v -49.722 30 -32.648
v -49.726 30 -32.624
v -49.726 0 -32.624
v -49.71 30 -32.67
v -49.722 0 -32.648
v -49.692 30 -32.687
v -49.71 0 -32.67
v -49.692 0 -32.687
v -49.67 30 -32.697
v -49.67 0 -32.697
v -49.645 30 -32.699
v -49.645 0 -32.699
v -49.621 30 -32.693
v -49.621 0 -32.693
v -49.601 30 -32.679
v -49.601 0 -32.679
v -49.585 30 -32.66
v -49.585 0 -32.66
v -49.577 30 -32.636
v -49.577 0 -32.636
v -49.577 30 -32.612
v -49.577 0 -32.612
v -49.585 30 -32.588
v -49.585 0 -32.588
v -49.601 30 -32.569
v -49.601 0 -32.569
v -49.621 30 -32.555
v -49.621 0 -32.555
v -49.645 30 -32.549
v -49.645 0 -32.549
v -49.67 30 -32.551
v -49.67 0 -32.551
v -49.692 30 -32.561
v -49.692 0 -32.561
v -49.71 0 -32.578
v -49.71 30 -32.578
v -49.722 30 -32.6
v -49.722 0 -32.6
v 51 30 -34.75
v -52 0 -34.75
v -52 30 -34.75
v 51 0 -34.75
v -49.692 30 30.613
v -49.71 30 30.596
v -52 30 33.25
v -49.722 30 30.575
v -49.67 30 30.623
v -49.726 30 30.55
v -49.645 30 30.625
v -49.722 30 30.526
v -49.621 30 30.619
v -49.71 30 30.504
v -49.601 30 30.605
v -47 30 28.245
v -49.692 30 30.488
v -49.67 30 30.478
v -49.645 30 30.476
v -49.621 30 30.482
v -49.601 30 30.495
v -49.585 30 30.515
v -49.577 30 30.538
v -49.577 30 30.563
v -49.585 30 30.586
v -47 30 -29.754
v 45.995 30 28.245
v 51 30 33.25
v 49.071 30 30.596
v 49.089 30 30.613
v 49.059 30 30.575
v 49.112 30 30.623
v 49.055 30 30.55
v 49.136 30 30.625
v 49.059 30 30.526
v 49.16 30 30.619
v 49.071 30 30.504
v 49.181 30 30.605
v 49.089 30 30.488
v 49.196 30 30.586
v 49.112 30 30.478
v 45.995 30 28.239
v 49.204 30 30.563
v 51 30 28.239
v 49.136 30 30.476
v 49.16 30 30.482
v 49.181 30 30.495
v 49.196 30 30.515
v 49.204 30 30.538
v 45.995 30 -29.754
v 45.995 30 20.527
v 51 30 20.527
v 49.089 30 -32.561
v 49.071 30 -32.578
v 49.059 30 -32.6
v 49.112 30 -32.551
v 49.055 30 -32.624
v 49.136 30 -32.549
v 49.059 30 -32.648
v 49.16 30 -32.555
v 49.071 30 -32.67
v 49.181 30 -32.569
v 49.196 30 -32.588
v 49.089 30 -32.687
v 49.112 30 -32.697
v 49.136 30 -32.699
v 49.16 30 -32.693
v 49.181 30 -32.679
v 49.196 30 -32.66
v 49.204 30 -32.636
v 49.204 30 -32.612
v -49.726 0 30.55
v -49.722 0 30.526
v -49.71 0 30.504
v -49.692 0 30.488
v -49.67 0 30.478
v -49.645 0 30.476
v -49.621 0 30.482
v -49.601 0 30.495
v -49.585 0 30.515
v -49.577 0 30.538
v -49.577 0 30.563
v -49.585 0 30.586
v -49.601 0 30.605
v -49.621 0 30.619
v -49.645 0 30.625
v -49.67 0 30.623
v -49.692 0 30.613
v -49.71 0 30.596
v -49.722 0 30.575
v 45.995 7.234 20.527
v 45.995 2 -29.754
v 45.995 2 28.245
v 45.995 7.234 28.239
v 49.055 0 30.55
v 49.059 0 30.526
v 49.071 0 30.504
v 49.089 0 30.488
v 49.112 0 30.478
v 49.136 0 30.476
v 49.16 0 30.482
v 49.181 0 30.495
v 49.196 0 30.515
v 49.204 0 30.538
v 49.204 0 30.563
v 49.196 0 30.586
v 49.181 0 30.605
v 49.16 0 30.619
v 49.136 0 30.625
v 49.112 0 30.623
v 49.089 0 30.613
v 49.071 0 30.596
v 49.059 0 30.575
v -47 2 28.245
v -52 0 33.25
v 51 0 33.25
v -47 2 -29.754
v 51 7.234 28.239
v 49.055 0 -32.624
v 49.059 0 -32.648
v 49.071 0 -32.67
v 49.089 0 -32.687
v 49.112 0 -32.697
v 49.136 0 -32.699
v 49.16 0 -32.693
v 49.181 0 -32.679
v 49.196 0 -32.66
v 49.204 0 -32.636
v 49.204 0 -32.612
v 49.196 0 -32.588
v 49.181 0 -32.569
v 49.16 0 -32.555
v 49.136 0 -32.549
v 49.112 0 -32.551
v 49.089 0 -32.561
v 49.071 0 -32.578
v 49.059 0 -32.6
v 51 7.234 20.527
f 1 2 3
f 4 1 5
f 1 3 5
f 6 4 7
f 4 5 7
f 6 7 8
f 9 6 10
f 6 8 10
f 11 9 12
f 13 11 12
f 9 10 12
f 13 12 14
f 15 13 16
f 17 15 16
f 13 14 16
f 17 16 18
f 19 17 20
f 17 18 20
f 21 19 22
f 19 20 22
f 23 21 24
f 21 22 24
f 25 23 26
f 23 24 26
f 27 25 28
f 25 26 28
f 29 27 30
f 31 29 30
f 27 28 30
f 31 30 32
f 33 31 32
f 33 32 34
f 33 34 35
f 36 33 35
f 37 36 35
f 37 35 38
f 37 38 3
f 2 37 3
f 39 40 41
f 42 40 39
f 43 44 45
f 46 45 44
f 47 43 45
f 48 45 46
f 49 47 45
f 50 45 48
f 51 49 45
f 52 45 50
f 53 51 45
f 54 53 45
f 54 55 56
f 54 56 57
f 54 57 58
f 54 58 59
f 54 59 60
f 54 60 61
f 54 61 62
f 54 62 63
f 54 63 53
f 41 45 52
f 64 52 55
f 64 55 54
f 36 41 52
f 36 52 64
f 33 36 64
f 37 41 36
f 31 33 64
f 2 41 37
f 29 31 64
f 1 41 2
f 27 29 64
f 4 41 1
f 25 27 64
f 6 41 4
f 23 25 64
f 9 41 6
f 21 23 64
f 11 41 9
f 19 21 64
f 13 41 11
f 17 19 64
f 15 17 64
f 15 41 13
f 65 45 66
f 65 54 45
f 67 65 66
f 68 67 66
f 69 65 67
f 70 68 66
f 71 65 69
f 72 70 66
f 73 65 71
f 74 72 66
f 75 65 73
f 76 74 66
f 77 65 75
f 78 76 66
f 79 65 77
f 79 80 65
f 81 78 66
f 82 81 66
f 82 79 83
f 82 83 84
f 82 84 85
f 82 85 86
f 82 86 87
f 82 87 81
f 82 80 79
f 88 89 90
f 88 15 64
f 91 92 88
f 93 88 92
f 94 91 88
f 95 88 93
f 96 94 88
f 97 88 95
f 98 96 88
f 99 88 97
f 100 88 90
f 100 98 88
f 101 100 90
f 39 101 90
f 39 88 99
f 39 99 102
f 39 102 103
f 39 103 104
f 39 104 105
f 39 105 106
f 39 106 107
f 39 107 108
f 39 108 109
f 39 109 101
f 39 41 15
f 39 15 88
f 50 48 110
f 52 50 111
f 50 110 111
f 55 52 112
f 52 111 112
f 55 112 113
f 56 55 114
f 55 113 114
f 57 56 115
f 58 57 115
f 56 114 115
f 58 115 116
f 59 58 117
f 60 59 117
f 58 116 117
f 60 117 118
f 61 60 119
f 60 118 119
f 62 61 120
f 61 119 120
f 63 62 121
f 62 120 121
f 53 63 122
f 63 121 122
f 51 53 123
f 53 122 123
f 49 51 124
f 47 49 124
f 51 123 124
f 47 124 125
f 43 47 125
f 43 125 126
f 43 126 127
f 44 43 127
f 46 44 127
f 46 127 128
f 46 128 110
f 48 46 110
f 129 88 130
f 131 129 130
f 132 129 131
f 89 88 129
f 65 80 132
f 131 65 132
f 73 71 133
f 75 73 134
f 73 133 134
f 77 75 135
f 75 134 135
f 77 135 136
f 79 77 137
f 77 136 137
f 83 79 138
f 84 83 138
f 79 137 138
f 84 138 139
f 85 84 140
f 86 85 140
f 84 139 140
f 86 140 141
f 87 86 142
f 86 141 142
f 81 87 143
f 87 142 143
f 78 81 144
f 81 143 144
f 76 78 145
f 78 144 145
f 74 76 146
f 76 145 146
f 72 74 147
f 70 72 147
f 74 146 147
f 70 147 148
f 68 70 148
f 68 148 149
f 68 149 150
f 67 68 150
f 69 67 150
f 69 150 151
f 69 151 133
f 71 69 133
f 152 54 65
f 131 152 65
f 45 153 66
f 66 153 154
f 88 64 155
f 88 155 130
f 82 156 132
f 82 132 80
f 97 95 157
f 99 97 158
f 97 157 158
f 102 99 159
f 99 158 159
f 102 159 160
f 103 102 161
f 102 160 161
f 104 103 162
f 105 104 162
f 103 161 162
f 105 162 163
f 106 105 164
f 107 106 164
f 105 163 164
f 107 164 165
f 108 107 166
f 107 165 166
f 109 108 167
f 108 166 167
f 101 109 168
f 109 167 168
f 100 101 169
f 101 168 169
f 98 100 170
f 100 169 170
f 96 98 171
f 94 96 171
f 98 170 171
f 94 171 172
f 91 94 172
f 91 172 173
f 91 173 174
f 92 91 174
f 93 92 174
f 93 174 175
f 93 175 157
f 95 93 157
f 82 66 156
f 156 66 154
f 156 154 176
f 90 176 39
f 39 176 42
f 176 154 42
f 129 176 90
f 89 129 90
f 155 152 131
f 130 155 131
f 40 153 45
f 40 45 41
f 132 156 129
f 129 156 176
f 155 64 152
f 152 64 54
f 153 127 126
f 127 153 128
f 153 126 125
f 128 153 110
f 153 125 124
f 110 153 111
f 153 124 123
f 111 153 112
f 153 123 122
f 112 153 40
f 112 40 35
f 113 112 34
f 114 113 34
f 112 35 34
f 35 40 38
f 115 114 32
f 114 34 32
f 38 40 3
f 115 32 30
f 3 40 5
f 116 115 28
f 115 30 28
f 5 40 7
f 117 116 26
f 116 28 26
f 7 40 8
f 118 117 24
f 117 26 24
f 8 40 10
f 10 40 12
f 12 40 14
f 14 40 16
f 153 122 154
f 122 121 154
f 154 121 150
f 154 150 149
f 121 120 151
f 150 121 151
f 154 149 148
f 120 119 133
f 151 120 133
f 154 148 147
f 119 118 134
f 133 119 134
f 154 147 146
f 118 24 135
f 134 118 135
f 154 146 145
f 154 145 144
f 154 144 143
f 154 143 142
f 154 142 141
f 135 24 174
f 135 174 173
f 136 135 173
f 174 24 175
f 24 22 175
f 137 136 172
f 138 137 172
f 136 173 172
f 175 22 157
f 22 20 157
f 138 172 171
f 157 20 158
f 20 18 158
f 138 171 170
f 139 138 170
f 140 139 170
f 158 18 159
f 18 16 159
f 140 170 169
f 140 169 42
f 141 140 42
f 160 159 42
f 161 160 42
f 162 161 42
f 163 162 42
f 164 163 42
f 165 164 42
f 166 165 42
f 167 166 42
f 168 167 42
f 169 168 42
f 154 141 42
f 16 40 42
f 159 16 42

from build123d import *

# Parameters (mm, degrees)
SKETCH1_W                    = 103
SKETCH1_H                    = 68
BOSS_EXTRUDE1_DEPTH          = 30
SKETCH2_W                    = 92.99558251
SKETCH2_H                    = 57.998770124
CUT_EXTRUDE1_DEPTH           = 28
SKETCH3_W                    = 7.71242133
SKETCH3_H                    = 22.765769716
CUT_EXTRUDE2_DEPTH           = 28
F_97_0_0059_DIAMETER_HOLE1_D = 0.14986


with BuildPart() as part:
    # Sketch1 → Boss-Extrude1 (new body)
    with BuildSketch(Plane(origin=(0, 0, 0), x_dir=(1, 0, 0), z_dir=(0, 1, 0))):
        with Locations((-0.5, 0.75)):
            Rectangle(SKETCH1_W, SKETCH1_H)
    extrude(amount=BOSS_EXTRUDE1_DEPTH)

    # Sketch2 → Cut-Extrude1 (cut)
    with BuildSketch(Plane(origin=(51, 30, -34.75), x_dir=(1, 0, 0), z_dir=(0, -1, 0))):
        with Locations((-51.502635722, 33.995679306)):
            Rectangle(SKETCH2_W, SKETCH2_H)
    extrude(amount=CUT_EXTRUDE1_DEPTH, mode=Mode.SUBTRACT)

    # Sketch3 → Cut-Extrude2 (cut)
    with BuildSketch(Plane(origin=(51, 0, 0), x_dir=(0, 0, -1), z_dir=(1, 0, 0))):
        with Locations((-24.383198114, 18.617115142)):
            Rectangle(SKETCH3_W, SKETCH3_H)
    extrude(amount=-CUT_EXTRUDE2_DEPTH, mode=Mode.SUBTRACT)

    # #97 (0.0059) Diameter Hole1 (through all)
    with Locations(Plane(origin=(0, 30, 0), x_dir=(1, 0, 0), z_dir=(0, 1, 0))):
        with Locations((49.13026129, -30.550335592), (49.13026129, 32.624025804), (-49.65125644, 32.624025804), (-49.65125644, -30.550335592)):
            Hole(F_97_0_0059_DIAMETER_HOLE1_D / 2)


solid = part.part
